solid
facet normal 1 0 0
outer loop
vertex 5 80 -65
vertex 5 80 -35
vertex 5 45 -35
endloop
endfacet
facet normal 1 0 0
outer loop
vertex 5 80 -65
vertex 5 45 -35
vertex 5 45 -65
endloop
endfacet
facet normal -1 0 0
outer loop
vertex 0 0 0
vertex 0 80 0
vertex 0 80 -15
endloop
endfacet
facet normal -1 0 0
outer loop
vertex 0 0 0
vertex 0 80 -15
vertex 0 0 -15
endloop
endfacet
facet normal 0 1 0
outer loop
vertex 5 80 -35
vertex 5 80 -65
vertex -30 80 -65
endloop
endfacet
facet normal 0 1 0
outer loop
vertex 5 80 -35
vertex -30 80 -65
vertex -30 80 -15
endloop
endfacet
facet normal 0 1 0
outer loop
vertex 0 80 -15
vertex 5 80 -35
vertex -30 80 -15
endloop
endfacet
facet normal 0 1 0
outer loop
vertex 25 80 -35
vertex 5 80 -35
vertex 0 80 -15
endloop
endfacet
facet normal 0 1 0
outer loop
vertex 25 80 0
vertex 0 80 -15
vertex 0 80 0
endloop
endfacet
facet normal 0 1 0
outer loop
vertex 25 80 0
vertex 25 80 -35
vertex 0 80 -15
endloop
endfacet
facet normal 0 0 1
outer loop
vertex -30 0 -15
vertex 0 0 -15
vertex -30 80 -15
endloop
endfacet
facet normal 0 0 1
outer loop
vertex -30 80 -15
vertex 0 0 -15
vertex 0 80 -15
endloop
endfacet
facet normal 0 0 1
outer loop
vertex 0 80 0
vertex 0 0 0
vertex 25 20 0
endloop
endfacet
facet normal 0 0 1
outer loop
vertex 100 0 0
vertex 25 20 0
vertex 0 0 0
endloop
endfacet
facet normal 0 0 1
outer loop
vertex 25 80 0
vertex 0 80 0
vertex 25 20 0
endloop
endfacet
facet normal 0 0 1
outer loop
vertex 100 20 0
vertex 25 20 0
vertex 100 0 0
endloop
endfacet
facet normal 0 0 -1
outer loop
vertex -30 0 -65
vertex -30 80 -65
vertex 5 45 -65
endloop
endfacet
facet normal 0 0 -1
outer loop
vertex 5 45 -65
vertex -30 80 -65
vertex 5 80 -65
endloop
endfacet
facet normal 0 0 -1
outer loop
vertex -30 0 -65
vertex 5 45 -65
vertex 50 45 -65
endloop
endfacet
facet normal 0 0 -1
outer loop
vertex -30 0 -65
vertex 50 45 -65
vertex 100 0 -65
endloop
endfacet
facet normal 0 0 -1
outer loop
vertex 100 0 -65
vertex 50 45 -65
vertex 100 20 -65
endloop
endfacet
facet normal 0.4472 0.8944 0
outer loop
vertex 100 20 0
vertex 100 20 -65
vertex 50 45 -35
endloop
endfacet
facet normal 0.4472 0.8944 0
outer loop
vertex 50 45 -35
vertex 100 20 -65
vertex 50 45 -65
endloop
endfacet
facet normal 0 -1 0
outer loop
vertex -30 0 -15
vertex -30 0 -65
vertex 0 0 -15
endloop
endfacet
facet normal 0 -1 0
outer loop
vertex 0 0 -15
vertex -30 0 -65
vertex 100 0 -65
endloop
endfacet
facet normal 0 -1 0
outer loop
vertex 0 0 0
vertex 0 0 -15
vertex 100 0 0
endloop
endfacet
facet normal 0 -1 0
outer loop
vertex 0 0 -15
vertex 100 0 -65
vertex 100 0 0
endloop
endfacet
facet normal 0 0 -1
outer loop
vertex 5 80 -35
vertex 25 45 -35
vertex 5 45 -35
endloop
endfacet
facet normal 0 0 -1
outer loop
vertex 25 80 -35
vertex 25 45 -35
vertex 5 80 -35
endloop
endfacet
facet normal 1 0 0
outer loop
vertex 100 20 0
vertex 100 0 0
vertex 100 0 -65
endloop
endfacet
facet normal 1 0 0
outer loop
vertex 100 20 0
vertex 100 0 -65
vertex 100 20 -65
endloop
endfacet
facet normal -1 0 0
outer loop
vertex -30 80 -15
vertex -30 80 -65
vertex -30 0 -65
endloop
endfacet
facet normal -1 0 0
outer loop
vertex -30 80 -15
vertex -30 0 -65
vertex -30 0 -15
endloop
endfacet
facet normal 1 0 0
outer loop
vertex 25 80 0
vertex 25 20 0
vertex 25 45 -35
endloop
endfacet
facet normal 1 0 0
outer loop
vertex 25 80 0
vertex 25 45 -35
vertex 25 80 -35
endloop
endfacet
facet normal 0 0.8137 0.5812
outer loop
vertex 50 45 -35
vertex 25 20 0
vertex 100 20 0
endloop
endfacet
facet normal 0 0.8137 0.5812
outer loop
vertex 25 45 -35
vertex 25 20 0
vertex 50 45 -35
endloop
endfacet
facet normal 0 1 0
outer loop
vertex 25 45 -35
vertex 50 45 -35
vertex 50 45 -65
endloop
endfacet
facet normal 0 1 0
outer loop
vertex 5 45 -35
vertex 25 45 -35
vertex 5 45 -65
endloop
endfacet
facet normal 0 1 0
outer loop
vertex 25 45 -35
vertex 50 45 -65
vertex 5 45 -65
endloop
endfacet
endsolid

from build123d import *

# Parameters (mm, degrees)
BOSS_EXTRUDE2_DEPTH = 65
SKETCH4_W           = 20
SKETCH4_H           = 30
CUT_EXTRUDE1_DEPTH  = 35
SKETCH5_W           = 50
SKETCH5_H           = 80
BOSS_EXTRUDE3_DEPTH = 30
SKETCH6_W           = 30
SKETCH6_H           = 25
CUT_EXTRUDE2_DEPTH  = 20
LOFT3_START         = -65
LOFT3_DEPTH         = 65
LOFT3_START_2       = 25
LOFT3_2_DEPTH       = 76


with BuildPart() as part:
    # Sketch3 → Boss-Extrude2 (new body)
    with BuildSketch(Plane.XY):
        Polygon((0, 0), (100, 0), (100, 20), (25, 20), (25, 80), (0, 80), align=None)
    extrude(amount=-BOSS_EXTRUDE2_DEPTH)

    # Sketch4 → Cut-Extrude1 (cut)
    with BuildSketch(Plane(origin=(0, 80, 0), x_dir=(1, 0, 0), z_dir=(0, 1, 0))):
        with Locations((15, 50)):
            Rectangle(SKETCH4_W, SKETCH4_H)
    extrude(amount=-CUT_EXTRUDE1_DEPTH, mode=Mode.SUBTRACT)

    # Sketch5 → Boss-Extrude3 (add)
    with BuildSketch(Plane.ZY):
        with Locations((-40, 40)):
            Rectangle(SKETCH5_W, SKETCH5_H)
    extrude(amount=BOSS_EXTRUDE3_DEPTH)

    # Sketch6 → Cut-Extrude2 (cut)
    with BuildSketch(Plane(origin=(25, 0, 0), x_dir=(0, 0, -1), z_dir=(1, 0, 0))):
        with Locations((50, 32.5)):
            Rectangle(SKETCH6_W, SKETCH6_H)
    extrude(amount=-CUT_EXTRUDE2_DEPTH, mode=Mode.SUBTRACT)

    # Loft3: read off the stored shape, not the designer's step
    # Loft3 outline → Loft3 (add)
    with BuildSketch(Plane.XY.offset(LOFT3_START)):
        Polygon((5, 45), (5, 20), (100, 20), (50, 45), align=None)
    extrude(amount=LOFT3_DEPTH)

    # Loft3 2 outline → Loft3 2 (cut)
    with BuildSketch(Plane.YZ.offset(LOFT3_START_2)):
        Polygon((20, 0), (45, -35), (45, 0), align=None)
    extrude(amount=LOFT3_2_DEPTH, mode=Mode.SUBTRACT)


solid = part.part
